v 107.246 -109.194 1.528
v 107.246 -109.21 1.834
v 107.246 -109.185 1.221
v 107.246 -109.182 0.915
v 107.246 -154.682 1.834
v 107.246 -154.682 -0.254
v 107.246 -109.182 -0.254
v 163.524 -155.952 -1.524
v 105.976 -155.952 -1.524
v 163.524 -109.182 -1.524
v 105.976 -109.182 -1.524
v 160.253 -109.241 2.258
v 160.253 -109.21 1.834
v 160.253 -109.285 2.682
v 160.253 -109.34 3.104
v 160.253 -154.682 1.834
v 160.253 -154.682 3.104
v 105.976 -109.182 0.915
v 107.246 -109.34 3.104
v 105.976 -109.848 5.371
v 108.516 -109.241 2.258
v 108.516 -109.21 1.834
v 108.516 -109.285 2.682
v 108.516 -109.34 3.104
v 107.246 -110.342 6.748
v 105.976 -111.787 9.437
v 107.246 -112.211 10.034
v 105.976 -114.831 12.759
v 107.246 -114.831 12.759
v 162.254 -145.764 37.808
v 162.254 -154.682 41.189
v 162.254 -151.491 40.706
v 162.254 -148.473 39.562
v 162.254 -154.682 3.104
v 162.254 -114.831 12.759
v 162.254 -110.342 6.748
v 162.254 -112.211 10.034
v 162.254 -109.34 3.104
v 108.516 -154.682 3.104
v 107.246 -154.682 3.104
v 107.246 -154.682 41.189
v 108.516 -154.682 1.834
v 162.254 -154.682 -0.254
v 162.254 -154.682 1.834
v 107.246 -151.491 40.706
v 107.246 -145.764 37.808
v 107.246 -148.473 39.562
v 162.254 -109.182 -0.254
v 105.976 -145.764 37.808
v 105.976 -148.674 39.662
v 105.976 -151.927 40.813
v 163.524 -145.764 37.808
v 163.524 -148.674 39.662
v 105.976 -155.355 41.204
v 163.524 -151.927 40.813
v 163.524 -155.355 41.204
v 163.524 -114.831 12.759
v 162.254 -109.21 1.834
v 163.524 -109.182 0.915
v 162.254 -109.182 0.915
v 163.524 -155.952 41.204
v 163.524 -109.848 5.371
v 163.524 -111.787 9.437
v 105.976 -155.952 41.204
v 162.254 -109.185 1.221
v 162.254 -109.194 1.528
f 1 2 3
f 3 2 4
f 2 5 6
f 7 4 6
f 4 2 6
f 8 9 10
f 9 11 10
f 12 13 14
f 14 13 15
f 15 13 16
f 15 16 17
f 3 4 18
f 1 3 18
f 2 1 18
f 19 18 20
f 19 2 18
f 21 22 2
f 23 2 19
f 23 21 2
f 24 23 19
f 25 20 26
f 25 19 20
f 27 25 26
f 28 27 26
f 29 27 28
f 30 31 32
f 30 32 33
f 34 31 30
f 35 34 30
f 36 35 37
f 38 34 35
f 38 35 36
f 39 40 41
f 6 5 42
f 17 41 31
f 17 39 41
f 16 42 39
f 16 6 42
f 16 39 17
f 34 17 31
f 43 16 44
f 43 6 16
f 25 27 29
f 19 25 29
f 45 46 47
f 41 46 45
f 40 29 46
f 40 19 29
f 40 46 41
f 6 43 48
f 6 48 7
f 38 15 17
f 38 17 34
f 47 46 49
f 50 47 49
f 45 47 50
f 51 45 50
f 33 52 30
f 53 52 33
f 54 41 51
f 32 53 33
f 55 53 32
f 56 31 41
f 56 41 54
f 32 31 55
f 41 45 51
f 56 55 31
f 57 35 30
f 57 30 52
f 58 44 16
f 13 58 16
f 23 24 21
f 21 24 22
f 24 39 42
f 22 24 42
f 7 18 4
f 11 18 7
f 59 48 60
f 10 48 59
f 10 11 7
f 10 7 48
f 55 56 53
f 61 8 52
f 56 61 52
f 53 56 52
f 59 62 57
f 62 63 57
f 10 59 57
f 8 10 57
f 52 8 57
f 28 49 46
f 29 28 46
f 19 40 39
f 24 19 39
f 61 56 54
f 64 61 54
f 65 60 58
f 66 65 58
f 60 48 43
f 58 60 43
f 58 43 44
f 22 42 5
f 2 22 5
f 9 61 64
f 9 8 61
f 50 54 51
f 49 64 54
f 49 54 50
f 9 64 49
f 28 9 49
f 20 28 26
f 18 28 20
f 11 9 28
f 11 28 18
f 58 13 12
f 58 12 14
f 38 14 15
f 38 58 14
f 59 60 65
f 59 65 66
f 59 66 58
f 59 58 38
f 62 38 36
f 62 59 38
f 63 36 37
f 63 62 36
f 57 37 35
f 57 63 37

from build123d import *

# Parameters (mm, degrees)
BOSS_EXTRUDE1_DEPTH = 45.5
SKETCH2_W           = 57.548
SKETCH2_H           = 4.628
BOSS_EXTRUDE2_DEPTH = 1.27
BOSS_EXTRUDE3_DEPTH = 38.1
CHAMFER2_SIZE       = 33.02
CHAMFER2_SIZE2      = 40.776304109
FILLET2_R           = 15.24
FILLET3_R           = 15.24


with BuildPart() as part:
    # Sketch1 → Boss-Extrude1 (new body)
    with BuildSketch(Plane.XZ.offset(154.681799526)):
        Polygon((108.516, 1.834), (107.246, 1.834), (107.246, -0.254), (146.442611067, -0.254), (162.254, -0.254), (162.254, 1.834), (160.252914004, 1.834), (160.252914004, 3.104), (163.524, 3.104), (163.524, -1.524), (105.976, -1.524), (105.976, 3.104), (108.516, 3.104), align=None)
    extrude(amount=-BOSS_EXTRUDE1_DEPTH)

    # Sketch2 → Boss-Extrude2 (add)
    with BuildSketch(Plane.XZ.offset(154.681799526)):
        with Locations((134.75, 0.79)):
            Rectangle(SKETCH2_W, SKETCH2_H)
    extrude(amount=BOSS_EXTRUDE2_DEPTH)

    # Sketch8 → Boss-Extrude3 (add)
    with BuildSketch(Plane.XY.offset(3.104)):
        Polygon((105.976, -109.181799526), (107.246, -109.181799526), (107.246, -154.681799526), (162.254, -154.681799526), (162.254, -109.181799526), (163.524, -109.181799526), (163.524, -155.951799526), (105.976, -155.951799526), align=None)
    extrude(amount=BOSS_EXTRUDE3_DEPTH)

    # Chamfer2
    chamfer2_edges = [part.edges().sort_by_distance(p)[0] for p in [
        (162.889, -109.181799526, 41.204),
        (106.611, -109.181799526, 41.204),
    ]]
    chamfer2_side = [part.faces().sort_by_distance(p)[0] for p in [
        (107.881, -109.181799526, 2.550760371),
    ]]
    chamfer(chamfer2_edges, length=CHAMFER2_SIZE, length2=CHAMFER2_SIZE2, reference=chamfer2_side[0])

    # Fillet2
    fillet2_edges = [part.edges().sort_by_distance(p)[0] for p in [
        (162.889, -109.181799526, 8.184),
        (106.611, -109.181799526, 8.184),
    ]]
    fillet(fillet2_edges, radius=FILLET2_R)

    # Fillet3
    fillet3_edges = [part.edges().sort_by_distance(p)[0] for p in [
        (106.611, -149.958103635, 41.204),
    ]]
    fillet(fillet3_edges, radius=FILLET3_R)


solid = part.part
